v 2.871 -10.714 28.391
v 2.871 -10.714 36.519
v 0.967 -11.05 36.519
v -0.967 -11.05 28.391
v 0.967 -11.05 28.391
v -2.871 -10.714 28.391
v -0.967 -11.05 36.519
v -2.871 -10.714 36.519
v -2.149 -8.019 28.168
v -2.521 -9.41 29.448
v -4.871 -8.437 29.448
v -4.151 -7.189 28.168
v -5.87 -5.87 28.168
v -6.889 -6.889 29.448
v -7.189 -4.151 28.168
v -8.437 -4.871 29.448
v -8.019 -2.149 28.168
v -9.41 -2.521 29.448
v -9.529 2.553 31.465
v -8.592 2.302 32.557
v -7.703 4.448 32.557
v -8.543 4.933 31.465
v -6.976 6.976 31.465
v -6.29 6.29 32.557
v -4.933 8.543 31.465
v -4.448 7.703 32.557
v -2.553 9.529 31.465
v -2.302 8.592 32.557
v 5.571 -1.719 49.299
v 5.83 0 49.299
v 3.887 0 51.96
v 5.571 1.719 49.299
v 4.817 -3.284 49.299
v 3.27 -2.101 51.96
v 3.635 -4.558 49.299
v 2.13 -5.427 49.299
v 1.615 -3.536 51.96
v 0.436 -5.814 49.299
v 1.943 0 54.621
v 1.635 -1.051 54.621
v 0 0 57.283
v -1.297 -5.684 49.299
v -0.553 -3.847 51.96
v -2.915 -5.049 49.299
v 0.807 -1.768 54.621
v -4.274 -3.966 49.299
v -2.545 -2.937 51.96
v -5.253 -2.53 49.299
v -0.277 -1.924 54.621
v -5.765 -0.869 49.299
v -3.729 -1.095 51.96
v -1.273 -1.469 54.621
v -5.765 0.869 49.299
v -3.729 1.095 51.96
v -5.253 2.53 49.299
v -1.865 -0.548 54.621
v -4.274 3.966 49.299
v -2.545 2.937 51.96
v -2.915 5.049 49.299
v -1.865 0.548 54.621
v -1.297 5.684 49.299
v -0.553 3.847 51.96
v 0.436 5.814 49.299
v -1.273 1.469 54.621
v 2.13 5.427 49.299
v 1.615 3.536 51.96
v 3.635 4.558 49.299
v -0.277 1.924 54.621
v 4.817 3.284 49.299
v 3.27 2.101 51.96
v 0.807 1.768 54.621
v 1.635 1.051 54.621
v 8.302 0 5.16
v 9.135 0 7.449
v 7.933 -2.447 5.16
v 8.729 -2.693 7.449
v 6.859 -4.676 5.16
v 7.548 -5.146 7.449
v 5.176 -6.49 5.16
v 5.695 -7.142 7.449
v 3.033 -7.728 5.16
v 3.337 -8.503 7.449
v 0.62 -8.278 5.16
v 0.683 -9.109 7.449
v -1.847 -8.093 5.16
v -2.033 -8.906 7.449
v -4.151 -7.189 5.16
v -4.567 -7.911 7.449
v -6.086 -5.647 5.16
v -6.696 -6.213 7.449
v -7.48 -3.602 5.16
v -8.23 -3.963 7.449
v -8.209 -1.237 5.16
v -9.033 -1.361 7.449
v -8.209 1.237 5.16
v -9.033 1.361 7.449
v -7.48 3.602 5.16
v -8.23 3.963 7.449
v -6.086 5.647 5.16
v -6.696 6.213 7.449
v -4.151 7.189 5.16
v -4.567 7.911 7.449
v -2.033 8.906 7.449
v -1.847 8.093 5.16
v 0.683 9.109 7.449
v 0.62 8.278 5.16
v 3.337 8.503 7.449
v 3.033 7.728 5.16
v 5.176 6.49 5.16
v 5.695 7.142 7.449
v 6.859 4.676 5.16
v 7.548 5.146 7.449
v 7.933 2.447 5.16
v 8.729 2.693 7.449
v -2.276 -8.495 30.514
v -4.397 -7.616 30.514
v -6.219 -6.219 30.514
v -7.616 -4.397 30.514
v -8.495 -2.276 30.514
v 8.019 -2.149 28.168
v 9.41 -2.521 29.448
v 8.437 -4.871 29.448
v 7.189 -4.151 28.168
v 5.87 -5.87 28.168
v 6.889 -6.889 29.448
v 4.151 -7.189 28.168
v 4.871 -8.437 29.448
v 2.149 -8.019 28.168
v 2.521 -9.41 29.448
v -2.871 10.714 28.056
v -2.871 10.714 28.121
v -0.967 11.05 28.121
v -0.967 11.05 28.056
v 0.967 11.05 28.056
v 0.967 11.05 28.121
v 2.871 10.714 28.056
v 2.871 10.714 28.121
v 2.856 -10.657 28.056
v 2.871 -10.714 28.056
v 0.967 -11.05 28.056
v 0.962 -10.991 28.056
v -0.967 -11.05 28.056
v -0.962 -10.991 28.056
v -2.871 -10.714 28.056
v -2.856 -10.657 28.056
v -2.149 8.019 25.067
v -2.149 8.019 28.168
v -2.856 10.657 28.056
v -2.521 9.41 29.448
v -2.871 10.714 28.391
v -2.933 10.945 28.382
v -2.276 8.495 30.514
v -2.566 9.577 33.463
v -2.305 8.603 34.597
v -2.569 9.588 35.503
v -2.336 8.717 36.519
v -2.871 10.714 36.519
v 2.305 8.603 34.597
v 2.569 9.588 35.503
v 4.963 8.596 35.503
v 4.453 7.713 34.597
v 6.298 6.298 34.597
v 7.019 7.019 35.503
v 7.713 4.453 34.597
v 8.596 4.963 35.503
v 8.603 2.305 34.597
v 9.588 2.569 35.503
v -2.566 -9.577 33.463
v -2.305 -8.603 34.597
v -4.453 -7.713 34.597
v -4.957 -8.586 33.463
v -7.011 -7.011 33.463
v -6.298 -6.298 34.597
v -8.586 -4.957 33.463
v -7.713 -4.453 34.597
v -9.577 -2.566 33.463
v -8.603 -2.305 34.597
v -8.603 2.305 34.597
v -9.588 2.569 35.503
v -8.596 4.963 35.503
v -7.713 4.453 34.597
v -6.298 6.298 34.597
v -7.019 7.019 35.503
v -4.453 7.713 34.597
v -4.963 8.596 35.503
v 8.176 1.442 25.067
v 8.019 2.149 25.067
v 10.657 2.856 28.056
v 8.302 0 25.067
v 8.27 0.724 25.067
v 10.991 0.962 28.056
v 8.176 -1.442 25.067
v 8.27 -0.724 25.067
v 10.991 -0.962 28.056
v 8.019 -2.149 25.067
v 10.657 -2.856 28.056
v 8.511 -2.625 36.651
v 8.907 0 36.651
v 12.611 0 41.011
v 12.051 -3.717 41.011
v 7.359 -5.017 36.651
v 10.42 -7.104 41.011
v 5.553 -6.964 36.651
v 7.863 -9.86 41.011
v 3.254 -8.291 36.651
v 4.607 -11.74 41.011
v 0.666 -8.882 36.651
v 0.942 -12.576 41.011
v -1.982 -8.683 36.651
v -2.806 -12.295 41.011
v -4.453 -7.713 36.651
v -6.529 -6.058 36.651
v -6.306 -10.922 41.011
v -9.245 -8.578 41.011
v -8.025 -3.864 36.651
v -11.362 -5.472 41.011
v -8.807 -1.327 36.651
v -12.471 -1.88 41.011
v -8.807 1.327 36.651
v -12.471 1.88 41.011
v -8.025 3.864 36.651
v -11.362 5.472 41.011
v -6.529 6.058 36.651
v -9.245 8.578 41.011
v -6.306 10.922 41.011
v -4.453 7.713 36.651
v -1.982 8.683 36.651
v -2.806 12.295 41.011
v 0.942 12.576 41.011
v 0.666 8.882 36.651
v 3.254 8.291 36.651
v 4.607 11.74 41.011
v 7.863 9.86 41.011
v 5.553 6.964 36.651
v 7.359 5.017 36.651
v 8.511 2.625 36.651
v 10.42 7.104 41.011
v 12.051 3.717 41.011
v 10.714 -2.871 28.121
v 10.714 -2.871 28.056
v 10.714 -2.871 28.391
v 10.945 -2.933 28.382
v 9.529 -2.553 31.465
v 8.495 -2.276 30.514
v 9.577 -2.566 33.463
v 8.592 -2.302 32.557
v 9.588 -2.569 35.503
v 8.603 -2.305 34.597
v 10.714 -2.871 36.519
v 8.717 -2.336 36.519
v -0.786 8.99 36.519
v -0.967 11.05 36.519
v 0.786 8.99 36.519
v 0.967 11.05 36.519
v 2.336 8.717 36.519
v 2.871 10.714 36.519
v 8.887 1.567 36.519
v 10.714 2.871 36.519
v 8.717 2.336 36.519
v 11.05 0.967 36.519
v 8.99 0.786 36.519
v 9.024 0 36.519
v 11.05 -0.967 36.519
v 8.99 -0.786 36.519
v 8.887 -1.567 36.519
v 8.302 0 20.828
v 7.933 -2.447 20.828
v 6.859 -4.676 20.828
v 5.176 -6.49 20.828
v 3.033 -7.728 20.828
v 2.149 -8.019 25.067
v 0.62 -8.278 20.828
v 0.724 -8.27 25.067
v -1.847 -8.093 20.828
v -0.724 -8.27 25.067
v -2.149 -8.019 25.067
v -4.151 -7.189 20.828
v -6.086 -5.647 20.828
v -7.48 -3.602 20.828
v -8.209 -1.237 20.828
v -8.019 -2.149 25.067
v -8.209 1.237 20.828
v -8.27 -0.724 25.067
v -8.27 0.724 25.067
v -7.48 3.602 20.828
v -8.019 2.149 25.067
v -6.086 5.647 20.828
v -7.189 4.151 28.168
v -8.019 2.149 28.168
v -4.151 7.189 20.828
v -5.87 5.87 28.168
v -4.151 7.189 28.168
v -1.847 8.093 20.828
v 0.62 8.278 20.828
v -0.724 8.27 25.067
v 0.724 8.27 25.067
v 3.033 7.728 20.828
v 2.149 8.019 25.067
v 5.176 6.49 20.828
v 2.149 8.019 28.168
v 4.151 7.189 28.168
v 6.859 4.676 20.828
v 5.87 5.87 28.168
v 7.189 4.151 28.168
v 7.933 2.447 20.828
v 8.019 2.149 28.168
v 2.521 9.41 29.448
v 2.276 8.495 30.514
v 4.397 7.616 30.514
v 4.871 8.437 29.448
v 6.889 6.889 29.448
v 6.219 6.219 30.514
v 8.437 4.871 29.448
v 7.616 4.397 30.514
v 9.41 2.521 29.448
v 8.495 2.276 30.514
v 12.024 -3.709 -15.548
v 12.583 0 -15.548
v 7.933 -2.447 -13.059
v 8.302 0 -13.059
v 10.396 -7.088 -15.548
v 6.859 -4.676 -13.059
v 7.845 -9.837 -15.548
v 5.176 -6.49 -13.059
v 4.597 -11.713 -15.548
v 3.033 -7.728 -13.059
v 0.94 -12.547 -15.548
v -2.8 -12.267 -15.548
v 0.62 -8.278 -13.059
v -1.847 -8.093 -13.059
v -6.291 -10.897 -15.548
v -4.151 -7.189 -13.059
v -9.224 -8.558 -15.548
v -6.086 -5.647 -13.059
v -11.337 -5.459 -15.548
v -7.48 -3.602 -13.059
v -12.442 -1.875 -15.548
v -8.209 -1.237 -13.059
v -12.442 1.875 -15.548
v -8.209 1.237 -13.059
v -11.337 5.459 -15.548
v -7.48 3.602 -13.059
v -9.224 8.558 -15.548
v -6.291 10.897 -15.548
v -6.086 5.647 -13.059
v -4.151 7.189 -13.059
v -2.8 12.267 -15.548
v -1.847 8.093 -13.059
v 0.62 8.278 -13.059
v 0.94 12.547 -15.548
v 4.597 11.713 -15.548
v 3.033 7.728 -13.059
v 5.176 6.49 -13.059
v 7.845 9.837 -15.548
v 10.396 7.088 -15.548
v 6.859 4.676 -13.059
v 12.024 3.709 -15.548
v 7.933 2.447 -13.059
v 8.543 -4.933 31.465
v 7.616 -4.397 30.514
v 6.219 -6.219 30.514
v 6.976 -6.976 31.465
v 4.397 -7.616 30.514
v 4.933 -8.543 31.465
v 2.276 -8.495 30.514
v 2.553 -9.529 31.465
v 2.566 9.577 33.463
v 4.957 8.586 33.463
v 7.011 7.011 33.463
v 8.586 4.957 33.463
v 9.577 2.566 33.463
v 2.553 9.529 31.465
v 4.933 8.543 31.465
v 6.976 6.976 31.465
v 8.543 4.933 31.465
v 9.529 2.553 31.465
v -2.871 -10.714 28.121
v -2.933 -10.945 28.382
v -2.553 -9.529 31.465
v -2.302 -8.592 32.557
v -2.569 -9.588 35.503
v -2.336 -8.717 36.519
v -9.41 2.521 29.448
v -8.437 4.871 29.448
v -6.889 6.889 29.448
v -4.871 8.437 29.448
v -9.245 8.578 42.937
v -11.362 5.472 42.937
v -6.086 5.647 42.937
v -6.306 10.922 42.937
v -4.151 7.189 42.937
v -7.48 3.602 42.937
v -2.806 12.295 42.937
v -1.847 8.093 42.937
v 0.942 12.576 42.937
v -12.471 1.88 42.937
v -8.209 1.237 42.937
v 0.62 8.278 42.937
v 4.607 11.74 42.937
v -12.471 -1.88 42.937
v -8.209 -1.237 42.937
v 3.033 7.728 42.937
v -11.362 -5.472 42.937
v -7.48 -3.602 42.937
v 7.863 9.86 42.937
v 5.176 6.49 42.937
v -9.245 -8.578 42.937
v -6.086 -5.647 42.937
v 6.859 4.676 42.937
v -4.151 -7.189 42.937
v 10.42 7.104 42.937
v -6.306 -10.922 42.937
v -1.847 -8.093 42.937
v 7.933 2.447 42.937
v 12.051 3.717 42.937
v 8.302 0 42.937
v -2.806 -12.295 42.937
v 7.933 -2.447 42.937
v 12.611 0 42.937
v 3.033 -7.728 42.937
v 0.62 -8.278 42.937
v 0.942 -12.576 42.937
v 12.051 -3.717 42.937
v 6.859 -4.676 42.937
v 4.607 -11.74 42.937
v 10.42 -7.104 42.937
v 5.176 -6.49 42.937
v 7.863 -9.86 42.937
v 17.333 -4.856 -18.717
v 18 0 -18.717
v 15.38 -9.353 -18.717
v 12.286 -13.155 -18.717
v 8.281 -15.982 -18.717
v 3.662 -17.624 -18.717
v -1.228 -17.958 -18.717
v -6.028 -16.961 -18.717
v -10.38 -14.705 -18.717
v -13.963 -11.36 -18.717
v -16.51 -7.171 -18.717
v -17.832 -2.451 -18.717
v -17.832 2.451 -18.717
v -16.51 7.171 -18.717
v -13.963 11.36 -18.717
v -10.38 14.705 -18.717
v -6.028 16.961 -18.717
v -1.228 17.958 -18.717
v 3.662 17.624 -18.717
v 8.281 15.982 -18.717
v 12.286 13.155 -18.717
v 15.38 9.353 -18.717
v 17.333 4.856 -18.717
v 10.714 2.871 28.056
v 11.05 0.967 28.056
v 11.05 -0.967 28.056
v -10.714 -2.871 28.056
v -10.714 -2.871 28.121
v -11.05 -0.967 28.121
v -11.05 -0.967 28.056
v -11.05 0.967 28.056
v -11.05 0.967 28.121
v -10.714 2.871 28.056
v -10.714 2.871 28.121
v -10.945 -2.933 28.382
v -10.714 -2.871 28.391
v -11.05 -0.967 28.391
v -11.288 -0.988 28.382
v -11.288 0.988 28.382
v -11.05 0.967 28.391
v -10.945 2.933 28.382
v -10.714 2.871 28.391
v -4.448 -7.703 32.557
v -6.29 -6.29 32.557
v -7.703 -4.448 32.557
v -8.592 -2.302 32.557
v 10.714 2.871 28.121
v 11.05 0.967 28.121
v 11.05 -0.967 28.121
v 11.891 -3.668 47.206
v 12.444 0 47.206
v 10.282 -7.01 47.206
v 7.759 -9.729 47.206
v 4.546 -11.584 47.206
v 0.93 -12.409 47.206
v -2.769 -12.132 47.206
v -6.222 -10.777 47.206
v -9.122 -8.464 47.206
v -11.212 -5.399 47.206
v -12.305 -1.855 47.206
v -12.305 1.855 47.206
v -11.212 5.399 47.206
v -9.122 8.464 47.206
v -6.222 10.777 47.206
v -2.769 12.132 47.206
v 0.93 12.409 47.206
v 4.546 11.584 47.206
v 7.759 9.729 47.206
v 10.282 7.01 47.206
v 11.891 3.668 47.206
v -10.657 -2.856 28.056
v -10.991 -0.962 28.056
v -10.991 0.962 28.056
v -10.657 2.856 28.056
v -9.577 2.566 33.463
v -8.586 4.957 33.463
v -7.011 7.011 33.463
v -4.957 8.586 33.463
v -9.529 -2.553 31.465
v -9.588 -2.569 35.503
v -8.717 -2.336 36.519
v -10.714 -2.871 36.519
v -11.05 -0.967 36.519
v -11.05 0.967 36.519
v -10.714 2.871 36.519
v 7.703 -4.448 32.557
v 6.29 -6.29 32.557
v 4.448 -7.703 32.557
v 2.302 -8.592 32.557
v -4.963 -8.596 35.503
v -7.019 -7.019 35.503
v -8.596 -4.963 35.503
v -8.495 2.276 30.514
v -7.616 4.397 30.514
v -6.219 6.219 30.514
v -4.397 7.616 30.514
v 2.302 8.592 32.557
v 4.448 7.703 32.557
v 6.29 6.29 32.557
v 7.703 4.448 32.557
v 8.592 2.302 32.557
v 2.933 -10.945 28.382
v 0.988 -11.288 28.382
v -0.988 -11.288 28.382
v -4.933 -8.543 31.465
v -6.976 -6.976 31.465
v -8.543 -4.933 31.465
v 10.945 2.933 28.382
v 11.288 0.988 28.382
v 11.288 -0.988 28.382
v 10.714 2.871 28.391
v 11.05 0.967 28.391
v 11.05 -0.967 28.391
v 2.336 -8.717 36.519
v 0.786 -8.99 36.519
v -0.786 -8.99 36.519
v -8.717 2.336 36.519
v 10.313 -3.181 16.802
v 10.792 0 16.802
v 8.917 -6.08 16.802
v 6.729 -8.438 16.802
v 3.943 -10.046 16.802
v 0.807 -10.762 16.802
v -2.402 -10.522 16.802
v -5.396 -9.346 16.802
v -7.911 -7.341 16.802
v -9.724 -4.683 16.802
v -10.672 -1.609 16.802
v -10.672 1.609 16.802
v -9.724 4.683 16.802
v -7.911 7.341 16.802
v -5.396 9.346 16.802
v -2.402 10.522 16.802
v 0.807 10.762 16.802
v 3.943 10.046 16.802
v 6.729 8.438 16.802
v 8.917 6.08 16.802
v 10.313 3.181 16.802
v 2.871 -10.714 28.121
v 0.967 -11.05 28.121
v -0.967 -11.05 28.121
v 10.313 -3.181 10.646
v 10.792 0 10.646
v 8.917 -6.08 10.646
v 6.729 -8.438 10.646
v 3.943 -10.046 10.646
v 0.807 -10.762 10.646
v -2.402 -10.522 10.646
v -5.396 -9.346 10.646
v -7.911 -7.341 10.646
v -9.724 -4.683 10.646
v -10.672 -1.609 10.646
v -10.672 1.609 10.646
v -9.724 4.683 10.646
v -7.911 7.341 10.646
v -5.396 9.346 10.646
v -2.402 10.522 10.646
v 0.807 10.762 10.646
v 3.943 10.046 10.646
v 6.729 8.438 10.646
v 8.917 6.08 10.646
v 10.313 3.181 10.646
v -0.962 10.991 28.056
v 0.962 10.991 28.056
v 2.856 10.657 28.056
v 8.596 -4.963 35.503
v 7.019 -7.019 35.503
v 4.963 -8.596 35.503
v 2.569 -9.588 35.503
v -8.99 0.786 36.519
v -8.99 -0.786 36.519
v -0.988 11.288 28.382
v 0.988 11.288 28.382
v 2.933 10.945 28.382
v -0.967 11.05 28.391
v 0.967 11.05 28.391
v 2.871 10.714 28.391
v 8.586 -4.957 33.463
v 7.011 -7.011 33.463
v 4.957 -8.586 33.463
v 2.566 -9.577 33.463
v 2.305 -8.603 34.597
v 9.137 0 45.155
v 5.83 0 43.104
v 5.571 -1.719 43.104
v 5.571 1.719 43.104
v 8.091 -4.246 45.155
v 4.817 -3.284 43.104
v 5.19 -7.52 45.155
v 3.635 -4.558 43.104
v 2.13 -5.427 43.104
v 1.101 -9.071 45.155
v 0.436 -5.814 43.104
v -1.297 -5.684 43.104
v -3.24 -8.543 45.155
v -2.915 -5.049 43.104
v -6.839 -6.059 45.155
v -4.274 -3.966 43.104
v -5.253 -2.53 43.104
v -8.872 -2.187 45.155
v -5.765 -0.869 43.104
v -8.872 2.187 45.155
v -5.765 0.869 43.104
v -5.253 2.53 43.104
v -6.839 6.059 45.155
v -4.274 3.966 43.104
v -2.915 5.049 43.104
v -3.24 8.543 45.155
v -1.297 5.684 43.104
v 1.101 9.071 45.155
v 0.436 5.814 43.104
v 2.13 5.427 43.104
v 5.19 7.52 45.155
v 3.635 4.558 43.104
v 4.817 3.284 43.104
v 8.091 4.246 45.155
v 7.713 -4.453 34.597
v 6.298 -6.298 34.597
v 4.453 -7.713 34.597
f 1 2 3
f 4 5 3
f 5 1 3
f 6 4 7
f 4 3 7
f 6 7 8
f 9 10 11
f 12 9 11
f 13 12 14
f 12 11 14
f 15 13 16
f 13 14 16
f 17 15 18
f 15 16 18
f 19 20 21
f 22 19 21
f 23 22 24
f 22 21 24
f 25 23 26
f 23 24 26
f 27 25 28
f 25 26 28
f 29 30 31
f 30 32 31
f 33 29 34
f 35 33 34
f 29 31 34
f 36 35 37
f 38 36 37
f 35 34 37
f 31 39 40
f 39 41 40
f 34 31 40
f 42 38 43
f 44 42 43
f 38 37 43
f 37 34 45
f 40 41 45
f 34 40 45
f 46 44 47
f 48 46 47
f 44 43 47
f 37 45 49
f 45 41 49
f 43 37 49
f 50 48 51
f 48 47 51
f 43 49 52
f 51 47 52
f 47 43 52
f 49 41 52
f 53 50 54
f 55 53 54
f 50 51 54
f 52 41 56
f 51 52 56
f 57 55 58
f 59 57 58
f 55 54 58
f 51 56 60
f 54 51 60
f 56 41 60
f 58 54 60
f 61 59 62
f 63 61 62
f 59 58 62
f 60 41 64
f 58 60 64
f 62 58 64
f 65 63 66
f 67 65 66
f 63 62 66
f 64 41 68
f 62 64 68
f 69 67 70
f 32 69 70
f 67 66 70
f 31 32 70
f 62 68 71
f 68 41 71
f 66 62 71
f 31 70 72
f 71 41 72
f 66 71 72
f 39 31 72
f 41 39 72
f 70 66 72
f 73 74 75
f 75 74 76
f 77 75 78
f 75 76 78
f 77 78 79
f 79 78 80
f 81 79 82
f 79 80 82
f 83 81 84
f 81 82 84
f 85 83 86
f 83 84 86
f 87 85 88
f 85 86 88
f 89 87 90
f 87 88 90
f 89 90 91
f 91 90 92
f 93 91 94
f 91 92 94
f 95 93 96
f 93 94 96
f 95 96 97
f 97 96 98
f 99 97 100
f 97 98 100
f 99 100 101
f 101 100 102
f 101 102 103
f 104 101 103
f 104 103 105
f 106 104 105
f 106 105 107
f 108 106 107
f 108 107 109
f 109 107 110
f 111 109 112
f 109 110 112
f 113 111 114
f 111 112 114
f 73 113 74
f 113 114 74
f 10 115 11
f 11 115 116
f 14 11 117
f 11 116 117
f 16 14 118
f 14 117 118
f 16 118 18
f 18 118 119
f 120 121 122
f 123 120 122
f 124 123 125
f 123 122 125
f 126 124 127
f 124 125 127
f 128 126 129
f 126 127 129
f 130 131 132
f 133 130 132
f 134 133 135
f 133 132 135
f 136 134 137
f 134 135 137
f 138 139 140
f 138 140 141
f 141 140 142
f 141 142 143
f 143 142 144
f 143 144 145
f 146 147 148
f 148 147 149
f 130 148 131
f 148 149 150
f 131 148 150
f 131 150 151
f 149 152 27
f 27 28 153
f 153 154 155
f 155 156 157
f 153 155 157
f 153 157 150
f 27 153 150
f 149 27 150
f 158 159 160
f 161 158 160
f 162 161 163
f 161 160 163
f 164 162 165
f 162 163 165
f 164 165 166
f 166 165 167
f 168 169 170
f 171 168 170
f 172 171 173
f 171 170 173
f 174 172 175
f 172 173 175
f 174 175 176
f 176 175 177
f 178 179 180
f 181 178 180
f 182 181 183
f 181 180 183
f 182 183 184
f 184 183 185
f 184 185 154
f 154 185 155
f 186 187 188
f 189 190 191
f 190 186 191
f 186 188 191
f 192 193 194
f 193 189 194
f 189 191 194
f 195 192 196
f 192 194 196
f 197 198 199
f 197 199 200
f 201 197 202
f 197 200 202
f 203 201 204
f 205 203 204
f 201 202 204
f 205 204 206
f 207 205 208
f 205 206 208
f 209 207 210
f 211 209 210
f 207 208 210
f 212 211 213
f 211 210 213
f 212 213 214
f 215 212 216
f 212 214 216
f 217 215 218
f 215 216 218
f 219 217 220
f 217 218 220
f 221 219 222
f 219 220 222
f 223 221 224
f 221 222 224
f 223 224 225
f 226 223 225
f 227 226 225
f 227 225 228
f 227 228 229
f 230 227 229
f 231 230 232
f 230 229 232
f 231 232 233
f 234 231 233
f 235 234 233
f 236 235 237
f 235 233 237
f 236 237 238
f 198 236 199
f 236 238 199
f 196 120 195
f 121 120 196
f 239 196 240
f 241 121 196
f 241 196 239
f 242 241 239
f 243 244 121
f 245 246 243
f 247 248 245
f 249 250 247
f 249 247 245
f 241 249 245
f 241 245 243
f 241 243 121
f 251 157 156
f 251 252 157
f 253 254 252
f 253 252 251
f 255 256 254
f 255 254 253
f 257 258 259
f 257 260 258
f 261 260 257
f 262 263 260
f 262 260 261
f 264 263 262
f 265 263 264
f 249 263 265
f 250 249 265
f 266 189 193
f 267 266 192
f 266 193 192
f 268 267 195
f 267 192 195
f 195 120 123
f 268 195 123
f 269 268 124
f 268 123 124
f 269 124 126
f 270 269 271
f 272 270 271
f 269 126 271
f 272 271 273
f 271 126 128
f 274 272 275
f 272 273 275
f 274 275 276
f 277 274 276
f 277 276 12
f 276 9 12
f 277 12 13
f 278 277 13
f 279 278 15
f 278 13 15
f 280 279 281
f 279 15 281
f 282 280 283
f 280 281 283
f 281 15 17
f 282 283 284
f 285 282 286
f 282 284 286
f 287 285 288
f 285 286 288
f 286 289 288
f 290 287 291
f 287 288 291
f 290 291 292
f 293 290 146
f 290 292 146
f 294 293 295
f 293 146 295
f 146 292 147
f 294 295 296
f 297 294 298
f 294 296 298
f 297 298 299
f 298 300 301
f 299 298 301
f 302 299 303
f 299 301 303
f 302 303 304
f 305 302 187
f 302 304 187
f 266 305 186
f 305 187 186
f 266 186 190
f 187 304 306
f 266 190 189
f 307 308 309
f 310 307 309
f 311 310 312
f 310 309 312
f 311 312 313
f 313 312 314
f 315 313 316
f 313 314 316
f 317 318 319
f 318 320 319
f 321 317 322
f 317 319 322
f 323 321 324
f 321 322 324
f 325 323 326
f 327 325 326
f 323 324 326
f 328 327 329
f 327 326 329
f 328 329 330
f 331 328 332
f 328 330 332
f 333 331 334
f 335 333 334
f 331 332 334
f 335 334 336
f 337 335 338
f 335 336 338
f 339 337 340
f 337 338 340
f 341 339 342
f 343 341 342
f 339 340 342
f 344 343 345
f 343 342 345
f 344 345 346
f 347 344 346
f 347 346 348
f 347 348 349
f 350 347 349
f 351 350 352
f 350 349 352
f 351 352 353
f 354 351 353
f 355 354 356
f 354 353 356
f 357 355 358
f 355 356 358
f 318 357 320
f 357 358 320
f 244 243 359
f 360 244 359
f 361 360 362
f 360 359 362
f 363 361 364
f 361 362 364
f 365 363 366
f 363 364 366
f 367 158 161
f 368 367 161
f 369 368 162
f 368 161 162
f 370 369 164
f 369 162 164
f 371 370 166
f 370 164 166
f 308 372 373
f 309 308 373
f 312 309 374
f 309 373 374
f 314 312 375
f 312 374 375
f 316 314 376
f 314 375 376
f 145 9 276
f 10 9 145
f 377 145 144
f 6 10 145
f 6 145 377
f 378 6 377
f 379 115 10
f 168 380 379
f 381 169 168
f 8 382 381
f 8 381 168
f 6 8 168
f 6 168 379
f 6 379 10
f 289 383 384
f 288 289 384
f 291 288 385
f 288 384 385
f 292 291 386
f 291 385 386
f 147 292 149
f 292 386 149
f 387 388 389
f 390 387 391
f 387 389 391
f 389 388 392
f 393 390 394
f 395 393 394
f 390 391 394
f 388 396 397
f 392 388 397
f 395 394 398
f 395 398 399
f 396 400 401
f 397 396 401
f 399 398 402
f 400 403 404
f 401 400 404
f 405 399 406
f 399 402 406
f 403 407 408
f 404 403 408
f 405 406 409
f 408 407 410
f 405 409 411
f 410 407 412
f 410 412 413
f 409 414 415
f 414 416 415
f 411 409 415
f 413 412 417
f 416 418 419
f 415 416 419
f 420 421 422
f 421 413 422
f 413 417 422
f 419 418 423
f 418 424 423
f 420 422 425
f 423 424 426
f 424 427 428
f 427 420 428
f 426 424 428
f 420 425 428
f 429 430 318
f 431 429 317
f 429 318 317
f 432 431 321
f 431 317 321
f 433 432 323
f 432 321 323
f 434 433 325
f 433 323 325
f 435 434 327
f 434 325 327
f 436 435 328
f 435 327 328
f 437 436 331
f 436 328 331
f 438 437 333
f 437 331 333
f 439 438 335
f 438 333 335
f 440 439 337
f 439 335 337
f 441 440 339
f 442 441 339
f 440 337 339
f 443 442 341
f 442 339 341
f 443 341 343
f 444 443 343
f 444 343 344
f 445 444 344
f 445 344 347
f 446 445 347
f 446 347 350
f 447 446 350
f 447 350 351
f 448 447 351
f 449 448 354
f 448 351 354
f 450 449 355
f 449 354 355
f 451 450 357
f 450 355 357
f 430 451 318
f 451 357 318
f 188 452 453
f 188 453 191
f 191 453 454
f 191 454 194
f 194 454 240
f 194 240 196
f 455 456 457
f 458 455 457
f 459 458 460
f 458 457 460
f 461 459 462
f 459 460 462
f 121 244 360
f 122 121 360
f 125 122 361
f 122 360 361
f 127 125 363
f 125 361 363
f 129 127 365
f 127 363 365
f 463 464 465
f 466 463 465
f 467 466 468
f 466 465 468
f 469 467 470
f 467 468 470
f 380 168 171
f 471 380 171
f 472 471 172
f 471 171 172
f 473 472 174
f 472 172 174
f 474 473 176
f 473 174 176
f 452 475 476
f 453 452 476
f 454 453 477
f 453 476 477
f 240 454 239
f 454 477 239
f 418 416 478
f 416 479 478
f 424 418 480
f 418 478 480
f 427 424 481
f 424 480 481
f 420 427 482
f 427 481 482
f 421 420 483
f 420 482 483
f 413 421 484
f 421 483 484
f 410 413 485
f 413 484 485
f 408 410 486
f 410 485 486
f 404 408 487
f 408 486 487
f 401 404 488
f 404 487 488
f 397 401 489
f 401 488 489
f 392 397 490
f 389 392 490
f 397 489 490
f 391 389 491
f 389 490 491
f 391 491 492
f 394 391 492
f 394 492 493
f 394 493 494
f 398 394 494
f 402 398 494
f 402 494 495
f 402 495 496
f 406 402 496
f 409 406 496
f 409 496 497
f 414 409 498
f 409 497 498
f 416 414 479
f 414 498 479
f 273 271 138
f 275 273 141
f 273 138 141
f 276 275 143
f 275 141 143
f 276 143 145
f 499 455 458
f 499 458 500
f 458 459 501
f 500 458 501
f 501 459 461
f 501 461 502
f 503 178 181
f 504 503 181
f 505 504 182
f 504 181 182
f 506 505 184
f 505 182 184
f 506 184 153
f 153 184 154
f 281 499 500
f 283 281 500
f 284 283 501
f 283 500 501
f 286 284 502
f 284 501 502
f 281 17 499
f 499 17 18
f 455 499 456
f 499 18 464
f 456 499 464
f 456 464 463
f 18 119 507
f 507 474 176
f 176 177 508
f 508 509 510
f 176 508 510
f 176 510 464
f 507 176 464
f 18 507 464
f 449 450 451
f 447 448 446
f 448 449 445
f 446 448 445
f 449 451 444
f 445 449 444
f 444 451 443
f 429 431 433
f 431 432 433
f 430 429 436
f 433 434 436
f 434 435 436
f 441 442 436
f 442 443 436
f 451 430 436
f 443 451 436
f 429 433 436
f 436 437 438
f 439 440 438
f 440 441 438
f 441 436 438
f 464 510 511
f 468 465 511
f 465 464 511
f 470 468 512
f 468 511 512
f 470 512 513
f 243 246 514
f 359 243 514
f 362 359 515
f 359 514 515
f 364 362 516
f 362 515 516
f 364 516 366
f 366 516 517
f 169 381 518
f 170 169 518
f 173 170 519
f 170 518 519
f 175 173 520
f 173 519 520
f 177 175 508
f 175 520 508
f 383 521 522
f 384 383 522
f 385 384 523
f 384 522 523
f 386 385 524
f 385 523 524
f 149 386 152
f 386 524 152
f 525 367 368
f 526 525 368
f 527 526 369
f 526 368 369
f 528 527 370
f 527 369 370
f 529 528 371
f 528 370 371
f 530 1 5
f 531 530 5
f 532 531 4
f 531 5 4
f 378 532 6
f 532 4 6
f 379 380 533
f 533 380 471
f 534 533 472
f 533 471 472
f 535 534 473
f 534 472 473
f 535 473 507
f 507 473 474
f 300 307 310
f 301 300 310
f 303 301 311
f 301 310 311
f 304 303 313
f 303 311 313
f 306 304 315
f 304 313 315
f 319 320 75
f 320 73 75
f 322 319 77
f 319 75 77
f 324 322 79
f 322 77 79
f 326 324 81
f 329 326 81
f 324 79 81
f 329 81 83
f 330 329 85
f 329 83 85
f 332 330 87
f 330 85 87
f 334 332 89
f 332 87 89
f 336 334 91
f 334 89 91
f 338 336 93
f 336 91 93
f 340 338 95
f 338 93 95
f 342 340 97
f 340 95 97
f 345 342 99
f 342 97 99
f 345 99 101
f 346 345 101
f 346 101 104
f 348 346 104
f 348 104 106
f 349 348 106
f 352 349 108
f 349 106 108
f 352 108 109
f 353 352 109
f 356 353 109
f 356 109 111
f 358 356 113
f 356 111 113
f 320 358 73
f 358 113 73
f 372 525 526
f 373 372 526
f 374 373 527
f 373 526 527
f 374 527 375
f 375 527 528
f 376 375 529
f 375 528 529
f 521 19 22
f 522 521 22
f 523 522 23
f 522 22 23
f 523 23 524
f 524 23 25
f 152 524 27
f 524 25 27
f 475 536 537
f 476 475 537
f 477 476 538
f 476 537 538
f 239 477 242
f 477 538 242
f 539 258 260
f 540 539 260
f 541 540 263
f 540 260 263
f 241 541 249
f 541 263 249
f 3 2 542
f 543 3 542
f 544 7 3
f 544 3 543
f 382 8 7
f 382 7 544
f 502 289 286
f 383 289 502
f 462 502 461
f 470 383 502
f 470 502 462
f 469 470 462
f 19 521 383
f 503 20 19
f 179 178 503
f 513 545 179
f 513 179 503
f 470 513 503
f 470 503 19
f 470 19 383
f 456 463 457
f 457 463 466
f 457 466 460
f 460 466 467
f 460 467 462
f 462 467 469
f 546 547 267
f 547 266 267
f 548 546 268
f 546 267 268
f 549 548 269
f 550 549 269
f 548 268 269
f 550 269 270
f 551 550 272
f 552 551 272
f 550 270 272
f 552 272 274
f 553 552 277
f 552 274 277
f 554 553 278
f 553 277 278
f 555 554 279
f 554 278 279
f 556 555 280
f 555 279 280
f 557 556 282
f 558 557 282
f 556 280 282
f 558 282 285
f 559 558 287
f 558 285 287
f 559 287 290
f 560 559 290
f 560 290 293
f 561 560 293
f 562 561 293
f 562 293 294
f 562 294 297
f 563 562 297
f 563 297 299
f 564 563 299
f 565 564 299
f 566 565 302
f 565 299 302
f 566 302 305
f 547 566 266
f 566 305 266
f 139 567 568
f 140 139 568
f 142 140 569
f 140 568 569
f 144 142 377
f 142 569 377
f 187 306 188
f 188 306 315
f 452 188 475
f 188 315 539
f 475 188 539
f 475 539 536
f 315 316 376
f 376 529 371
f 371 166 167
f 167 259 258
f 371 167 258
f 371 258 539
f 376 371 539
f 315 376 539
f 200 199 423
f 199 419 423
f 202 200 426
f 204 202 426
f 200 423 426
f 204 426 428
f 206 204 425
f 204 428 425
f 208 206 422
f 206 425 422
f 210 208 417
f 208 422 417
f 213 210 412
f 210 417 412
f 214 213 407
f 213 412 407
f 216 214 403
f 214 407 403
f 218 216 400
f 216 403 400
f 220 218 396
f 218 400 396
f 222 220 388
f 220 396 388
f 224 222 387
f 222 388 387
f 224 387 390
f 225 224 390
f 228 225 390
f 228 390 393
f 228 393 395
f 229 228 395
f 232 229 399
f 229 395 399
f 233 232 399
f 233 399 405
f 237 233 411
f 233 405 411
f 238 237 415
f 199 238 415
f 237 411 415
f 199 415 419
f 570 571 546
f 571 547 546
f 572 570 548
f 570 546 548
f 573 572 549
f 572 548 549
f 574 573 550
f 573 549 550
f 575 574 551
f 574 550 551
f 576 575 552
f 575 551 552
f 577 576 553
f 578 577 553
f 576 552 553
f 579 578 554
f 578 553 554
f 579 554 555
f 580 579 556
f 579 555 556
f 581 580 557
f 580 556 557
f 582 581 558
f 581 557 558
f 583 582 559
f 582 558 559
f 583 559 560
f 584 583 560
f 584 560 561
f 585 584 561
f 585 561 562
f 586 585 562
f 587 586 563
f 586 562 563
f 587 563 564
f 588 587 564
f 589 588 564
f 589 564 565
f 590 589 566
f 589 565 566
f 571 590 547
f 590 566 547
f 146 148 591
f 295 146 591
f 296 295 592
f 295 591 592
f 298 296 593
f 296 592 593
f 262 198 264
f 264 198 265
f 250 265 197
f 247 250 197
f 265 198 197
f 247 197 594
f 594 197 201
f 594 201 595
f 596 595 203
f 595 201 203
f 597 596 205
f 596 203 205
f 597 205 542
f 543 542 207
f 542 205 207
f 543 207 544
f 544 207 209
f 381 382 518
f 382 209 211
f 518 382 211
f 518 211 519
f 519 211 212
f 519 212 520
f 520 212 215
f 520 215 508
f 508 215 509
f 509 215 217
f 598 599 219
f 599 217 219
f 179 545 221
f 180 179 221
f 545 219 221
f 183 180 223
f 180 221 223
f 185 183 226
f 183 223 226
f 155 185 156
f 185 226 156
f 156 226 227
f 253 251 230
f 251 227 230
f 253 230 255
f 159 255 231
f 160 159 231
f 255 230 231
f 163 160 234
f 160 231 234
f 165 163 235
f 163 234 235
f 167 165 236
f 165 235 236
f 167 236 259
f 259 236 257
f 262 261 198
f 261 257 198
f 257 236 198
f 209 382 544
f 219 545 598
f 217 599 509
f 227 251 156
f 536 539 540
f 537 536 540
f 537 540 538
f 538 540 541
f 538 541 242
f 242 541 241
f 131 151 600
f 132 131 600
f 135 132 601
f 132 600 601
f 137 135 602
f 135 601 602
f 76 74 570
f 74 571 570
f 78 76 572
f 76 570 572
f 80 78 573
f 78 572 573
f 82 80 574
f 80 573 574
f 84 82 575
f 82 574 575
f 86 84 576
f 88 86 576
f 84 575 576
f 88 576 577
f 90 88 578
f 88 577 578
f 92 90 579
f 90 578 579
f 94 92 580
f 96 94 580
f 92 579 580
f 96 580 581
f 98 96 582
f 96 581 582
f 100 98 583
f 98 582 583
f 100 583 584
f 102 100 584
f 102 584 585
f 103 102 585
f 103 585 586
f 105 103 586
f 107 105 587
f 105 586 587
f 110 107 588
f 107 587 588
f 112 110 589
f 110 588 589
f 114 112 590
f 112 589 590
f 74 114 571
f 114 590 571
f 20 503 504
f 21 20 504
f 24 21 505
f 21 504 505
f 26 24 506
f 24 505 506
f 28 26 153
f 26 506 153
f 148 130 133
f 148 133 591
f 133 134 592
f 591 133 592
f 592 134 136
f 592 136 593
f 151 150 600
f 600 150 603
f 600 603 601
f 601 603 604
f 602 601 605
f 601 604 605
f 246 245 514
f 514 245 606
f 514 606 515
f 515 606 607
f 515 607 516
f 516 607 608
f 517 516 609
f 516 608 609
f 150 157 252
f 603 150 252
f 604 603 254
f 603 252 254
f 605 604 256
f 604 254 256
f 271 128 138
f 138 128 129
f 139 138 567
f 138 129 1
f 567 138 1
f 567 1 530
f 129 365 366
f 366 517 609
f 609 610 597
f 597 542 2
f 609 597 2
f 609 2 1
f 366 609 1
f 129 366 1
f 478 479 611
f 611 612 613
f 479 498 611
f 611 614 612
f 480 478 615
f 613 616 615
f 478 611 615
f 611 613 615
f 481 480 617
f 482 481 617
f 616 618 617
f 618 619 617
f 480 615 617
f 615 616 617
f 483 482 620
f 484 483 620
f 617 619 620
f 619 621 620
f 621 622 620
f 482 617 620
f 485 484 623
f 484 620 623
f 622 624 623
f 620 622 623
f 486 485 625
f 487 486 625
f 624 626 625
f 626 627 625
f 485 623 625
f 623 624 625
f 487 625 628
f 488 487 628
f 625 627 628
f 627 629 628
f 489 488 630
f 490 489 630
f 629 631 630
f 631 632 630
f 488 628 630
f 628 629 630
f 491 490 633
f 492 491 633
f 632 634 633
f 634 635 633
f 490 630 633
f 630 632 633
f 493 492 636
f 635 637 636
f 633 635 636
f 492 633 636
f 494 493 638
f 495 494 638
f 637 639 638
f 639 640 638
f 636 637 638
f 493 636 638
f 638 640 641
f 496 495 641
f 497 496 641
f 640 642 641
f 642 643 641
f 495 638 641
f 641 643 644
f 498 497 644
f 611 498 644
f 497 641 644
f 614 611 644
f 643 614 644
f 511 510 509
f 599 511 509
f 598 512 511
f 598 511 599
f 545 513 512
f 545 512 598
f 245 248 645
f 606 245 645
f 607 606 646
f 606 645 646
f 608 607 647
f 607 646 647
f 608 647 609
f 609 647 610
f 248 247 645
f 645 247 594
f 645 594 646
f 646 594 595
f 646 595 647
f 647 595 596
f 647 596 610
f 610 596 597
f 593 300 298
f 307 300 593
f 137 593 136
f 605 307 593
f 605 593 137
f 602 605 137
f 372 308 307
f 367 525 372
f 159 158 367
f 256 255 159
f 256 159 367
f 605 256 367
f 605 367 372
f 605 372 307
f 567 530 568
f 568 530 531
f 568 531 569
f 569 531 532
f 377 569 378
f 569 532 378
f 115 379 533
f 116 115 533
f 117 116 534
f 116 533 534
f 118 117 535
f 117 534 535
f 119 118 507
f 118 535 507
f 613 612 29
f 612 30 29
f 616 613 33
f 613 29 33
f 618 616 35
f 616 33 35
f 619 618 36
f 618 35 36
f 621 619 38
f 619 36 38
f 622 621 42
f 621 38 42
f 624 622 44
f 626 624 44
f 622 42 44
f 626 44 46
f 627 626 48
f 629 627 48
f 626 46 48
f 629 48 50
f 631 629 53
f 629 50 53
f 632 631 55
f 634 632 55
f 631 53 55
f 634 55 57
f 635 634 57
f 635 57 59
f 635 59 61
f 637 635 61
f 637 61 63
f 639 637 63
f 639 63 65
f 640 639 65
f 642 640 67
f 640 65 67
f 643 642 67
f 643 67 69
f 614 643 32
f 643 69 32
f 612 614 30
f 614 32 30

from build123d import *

# Parameters (mm, degrees)
F1_W            = 3.9823013358
F1_H            = 8.4623899311
F3_ANGLE_BACK   = 15
F3_ANGLE        = 30
F3_COPIES_COUNT = 4
F5_ANGLE_BACK   = 15
F5_ANGLE        = 30
F5_COPIES_COUNT = 4


# Not quite as in the source:
# - a pattern or mirror of a feature is missing from the dataset's text; its kind, count and spacing are read off the source's solid


with BuildPart() as f2:
    # F0 (on Front) → F2 (revolve)
    with BuildSketch(Plane.XZ):
        Polygon((0, 57.2826008411), (0, -18.7173991589), (18, -18.7173991589), (12.58260943, -15.5477793887), (8.3016352728, -13.0588412285), (8.3016352728, -4.7955662012), (8.3016352728, 1.6756732948), (8.3016352728, 5.1601859741), (9.1348709539, 7.4490089901), (10.7923932374, 10.6456615031), (10.7923932374, 16.8021768332), (8.3016352728, 20.8275895566), (8.3016352728, 28.1680505723), (9.7421156242, 29.4479895383), (8.7946596922, 30.5142838619), (9.8650568815, 31.4653853958), (8.8950488368, 32.5570605196), (9.914630721, 33.4630101088), (8.9067585183, 34.5972986517), (9.9263404025, 35.5032482409), (8.9067585183, 36.6507151981), (12.6114161685, 41.0112217069), (12.6114161685, 42.9367274046), (8.3016352728, 42.9367274046), (12.4439811334, 47.2063235939), (5.8302935213, 43.1041605771), (5.8302935213, 49.299262464), align=None)
    revolve(axis=Axis((0, 0, 19.2826008411), (0, 0, -1)))

    # F1 (on Front) → F3 (revolve)
    with BuildSketch(Plane.XZ, mode=Mode.PRIVATE) as f3_sk:
        with Locations((9.1009729076, 32.2875799611)):
            Rectangle(F1_W, F1_H)
    f3 = revolve(f3_sk.sketch.rotate(Axis((0, 0, 30.8512914926), (0, 0, -1)), -F3_ANGLE_BACK), axis=Axis((0, 0, 30.8512914926), (0, 0, -1)), revolution_arc=F3_ANGLE)

    # F3_copies: F3 ×4 about axis
    f3_copies_axis = Axis((0, 0, 0), (0, 0, 1))
    for i in range(1, F3_COPIES_COUNT):
        add(f3.rotate(f3_copies_axis, i * 360 / F3_COPIES_COUNT))

    # F4 (on Front) → F5 (revolve)
    with BuildSketch(Plane.XZ, mode=Mode.PRIVATE) as f5_sk:
        Polygon((8.193298243, 24.9484814703), (11.3307544962, 28.381921351), (8.193298243, 28.5003166646), align=None)
    f5 = revolve(f5_sk.sketch.rotate(Axis((0, 0, 30.8512914926), (0, 0, -1)), -F5_ANGLE_BACK), axis=Axis((0, 0, 30.8512914926), (0, 0, -1)), revolution_arc=F5_ANGLE)

    # F5_copies: F5 ×4 about axis
    f5_copies_axis = Axis((0, 0, 0), (0, 0, 1))
    for i in range(1, F5_COPIES_COUNT):
        add(f5.rotate(f5_copies_axis, i * 360 / F5_COPIES_COUNT))


solid = f2.part
